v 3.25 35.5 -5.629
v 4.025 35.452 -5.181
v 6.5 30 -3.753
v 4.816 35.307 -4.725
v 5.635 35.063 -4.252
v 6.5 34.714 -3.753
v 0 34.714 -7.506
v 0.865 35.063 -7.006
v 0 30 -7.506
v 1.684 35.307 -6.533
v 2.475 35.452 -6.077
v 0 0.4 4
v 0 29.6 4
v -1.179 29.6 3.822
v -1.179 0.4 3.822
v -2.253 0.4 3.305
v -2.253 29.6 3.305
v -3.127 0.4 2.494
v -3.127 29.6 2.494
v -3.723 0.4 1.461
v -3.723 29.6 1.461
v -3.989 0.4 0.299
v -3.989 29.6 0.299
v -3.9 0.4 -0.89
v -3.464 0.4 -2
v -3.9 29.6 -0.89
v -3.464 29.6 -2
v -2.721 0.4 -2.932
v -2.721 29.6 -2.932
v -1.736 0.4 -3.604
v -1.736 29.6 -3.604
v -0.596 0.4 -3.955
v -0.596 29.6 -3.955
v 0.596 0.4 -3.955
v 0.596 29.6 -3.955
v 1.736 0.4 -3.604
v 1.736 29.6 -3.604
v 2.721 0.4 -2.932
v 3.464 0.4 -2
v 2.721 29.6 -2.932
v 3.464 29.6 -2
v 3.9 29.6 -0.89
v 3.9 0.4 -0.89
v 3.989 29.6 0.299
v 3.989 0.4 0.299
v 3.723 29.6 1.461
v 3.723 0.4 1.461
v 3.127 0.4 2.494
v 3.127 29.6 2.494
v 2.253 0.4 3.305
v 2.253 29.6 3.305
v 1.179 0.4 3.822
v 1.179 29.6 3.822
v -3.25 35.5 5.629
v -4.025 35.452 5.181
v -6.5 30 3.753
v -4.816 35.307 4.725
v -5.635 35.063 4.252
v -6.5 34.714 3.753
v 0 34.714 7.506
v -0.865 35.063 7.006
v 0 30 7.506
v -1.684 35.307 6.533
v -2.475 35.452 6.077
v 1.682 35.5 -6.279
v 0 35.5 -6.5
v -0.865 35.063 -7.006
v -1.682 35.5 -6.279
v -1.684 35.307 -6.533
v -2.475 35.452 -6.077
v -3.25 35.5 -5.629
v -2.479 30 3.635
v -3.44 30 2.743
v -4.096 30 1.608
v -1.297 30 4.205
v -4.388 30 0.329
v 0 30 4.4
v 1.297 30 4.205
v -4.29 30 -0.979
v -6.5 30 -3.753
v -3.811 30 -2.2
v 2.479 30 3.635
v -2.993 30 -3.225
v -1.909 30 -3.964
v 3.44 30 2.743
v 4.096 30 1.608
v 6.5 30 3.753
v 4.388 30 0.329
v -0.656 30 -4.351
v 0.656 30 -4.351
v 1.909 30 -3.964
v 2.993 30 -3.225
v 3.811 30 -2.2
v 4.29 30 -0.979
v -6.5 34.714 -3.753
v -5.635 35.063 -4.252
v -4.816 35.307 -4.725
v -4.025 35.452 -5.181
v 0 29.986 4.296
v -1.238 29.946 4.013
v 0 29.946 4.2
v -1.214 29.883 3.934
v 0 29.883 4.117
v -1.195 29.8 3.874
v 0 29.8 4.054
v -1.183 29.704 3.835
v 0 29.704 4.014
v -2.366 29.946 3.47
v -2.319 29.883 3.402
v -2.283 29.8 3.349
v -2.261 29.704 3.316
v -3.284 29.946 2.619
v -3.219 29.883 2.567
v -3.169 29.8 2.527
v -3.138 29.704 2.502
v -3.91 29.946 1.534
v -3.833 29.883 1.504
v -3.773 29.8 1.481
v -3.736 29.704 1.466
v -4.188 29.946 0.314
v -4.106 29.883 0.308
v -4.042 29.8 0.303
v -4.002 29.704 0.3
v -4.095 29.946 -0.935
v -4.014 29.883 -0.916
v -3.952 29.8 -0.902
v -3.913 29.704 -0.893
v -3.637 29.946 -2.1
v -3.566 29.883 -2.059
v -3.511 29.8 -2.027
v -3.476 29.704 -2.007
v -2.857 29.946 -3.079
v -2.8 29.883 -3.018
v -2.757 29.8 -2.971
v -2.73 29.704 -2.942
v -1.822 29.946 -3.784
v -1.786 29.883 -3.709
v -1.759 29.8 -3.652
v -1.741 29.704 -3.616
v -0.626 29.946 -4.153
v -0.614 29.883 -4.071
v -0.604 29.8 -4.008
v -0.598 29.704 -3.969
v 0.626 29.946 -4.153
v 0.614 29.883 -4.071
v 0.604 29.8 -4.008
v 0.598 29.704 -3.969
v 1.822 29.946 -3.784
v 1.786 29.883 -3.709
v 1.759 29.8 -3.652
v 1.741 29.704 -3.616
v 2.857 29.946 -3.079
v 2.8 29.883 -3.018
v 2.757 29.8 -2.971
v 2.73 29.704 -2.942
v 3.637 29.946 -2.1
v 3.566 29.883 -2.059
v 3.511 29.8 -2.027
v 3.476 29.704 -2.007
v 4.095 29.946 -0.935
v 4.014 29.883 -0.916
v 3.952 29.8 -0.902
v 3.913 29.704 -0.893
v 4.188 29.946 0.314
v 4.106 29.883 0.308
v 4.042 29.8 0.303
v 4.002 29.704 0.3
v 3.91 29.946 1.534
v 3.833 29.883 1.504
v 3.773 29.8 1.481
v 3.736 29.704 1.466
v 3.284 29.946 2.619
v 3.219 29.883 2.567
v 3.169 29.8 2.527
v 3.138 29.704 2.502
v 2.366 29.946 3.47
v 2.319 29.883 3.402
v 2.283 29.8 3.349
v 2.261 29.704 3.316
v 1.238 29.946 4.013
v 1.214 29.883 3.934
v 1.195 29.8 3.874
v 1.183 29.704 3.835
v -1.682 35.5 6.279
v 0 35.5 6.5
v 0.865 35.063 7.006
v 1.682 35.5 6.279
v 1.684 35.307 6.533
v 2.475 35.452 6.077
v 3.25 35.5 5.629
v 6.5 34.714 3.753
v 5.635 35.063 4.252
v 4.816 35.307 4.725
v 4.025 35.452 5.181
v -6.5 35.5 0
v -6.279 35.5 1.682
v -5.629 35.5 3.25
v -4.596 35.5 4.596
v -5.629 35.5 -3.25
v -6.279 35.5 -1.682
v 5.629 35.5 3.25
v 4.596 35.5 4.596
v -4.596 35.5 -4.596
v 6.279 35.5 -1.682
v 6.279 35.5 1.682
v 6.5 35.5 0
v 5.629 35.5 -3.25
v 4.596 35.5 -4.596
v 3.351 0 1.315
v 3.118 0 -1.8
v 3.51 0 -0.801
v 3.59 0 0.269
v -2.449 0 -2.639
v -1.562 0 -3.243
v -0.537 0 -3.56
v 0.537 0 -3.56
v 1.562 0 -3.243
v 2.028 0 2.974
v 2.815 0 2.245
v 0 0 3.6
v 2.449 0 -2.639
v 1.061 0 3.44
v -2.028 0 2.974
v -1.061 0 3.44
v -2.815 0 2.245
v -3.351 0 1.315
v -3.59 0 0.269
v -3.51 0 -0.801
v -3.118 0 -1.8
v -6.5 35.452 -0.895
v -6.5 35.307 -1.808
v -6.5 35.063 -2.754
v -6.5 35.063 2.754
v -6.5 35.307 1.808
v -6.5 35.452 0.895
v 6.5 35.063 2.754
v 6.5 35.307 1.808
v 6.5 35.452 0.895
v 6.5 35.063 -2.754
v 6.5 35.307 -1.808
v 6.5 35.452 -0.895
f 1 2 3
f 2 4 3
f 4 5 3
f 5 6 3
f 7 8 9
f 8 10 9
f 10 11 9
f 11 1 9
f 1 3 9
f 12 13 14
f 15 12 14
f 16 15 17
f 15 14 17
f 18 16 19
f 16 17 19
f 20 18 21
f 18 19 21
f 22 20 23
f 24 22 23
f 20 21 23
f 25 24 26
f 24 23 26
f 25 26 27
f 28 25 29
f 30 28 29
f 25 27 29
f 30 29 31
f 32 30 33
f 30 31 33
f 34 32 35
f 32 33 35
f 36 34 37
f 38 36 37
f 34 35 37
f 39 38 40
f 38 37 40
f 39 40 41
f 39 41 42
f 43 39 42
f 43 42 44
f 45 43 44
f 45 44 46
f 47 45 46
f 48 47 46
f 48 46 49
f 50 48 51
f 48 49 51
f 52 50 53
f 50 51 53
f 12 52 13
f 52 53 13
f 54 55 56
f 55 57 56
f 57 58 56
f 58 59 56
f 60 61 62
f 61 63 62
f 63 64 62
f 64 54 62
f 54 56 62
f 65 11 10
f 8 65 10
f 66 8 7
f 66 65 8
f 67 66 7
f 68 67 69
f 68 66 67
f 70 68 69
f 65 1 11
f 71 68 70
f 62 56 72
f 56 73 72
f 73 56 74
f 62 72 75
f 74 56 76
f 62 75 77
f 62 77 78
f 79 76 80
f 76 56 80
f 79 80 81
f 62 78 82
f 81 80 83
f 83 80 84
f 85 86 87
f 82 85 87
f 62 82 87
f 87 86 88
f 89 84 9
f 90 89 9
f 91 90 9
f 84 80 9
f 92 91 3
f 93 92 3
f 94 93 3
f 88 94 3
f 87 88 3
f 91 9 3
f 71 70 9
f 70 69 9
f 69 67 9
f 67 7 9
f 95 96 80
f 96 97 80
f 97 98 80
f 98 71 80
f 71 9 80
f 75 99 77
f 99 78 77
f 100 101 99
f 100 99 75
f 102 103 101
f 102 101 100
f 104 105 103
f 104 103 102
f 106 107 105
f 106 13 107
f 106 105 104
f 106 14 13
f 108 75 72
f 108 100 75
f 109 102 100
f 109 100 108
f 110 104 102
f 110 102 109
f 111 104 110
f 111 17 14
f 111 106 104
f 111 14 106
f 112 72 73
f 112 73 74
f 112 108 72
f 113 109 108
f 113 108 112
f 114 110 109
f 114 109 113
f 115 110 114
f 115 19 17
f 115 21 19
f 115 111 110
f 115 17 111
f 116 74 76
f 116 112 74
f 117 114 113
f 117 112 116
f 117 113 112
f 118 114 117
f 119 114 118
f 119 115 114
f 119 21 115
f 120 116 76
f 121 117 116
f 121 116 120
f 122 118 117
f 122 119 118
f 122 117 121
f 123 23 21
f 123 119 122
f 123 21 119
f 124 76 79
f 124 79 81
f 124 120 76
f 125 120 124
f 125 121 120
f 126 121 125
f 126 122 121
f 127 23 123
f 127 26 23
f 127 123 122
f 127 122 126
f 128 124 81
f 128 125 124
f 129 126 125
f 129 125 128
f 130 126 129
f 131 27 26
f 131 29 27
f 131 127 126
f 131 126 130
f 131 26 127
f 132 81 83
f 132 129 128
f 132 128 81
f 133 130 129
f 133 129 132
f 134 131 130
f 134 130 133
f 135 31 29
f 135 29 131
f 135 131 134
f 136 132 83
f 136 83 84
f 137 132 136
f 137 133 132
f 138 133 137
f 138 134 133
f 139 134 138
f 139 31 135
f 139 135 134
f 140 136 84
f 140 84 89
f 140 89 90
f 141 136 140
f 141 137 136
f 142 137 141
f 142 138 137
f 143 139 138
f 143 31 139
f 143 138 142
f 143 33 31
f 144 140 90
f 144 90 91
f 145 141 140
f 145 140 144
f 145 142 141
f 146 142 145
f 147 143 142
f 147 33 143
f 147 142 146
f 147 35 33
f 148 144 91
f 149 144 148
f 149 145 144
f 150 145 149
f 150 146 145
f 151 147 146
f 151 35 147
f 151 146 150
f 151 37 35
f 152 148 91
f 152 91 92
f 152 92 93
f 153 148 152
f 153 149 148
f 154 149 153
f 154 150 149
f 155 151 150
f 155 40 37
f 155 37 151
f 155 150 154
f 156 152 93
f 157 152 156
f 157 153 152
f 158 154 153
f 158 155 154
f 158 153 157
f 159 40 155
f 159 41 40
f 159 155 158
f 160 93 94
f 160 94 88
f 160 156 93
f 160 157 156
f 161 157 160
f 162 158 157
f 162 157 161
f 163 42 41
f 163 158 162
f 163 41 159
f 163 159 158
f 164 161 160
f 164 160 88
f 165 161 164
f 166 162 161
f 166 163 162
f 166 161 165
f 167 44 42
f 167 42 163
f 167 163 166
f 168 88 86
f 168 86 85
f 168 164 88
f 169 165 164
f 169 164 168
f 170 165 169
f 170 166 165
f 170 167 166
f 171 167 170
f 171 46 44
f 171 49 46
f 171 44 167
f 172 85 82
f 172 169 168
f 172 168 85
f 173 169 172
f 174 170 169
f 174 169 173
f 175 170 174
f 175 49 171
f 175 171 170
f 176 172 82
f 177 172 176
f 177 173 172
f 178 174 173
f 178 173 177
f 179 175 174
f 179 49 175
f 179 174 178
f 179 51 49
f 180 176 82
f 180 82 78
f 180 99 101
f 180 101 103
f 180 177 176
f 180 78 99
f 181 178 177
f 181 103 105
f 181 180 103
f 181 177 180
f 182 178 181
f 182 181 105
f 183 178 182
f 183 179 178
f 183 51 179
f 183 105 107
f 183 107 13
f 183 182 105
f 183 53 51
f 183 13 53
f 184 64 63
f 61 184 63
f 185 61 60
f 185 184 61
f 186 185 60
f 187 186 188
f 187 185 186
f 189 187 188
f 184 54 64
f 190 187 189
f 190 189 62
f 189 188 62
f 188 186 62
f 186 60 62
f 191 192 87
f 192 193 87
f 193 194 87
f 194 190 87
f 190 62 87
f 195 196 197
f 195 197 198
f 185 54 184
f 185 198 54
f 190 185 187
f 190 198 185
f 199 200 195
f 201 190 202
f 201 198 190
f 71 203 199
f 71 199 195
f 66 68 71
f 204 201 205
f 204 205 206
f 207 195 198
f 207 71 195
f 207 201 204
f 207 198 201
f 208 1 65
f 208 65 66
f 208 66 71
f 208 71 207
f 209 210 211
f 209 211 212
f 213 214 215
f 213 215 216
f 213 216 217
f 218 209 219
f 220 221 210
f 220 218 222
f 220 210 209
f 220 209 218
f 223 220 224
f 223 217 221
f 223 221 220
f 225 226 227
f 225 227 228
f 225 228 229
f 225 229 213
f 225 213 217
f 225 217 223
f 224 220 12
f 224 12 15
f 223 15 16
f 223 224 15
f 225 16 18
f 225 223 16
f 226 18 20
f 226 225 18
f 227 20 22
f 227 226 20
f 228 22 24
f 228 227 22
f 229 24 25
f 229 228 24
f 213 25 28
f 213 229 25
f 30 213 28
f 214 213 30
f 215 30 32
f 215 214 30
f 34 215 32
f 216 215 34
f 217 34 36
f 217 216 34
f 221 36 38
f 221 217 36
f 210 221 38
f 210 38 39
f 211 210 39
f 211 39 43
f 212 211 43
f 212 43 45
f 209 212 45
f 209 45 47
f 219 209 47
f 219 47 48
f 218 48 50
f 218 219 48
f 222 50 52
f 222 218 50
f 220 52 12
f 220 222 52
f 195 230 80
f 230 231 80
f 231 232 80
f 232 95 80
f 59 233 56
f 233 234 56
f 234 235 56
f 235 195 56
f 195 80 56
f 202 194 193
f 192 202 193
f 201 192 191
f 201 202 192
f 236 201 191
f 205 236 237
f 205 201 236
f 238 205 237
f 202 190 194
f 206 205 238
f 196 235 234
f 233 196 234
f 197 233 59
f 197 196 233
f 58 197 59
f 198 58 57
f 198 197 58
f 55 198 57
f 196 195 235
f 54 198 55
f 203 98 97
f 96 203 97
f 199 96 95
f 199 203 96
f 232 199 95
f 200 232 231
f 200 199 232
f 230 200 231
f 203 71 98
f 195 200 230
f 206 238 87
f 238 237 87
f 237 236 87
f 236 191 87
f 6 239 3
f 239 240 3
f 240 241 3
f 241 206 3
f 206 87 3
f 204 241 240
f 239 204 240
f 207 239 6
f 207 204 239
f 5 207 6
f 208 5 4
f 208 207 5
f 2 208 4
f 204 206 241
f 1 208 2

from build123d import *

# Parameters (mm, degrees)
SKETCH1_W           = 4
SKETCH1_H           = 30
BOSS_EXTRUDE1_DEPTH = 5.5
FILLET1_R           = 0.4
CHAMFER1_SIZE       = 0.4
SKETCH3_OUTSIDE_W   = 25.696
SKETCH3_OUTSIDE_H   = 27.708
SKETCH3_OUTSIDE_R   = 6.5
CUT_EXTRUDE1_DEPTH  = 1
CUT_EXTRUDE1_DRAFT  = -52


with BuildPart() as part:
    # Sketch1 → Revolve1 (revolve)
    with BuildSketch(Plane.XY, mode=Mode.PRIVATE) as revolve1_sk:
        with Locations((-2, 15)):
            Rectangle(SKETCH1_W, SKETCH1_H)
    revolve(revolve1_sk.sketch.rotate(Axis((0, 30, 0), (0, -1, 0)), 270), axis=Axis((0, 30, 0), (0, -1, 0)))

    # Sketch2 → Boss-Extrude1 (add)
    with BuildSketch(Plane(origin=(0, 30, 0), x_dir=(1, 0, 0), z_dir=(0, 1, 0))):
        Polygon((0, -7.505553499), (6.5, -3.75277675), (6.5, 3.75277675), (0, 7.505553499), (-6.5, 3.75277675), (-6.5, -3.75277675), align=None)
    extrude(amount=BOSS_EXTRUDE1_DEPTH)

    # Fillet1
    fillet1_edges = [part.edges().sort_by_distance(p)[0] for p in [
        (0, 30, -4),
    ]]
    fillet(fillet1_edges, radius=FILLET1_R)

    # Chamfer1
    chamfer1_edges = [part.edges().sort_by_distance(p)[0] for p in [
        (0, 0, -4),
    ]]
    chamfer(chamfer1_edges, length=CHAMFER1_SIZE)


with BuildPart() as cut_extrude1_tool:
    # Sketch3 outside → Cut-Extrude1 (with draft: the straight prism first)
    with BuildSketch(Plane(origin=(0, 35.5, 0), x_dir=(1, 0, 0), z_dir=(0, 1, 0))):
        Rectangle(SKETCH3_OUTSIDE_W, SKETCH3_OUTSIDE_H)
        Circle(SKETCH3_OUTSIDE_R, mode=Mode.SUBTRACT)
    extrude(amount=-CUT_EXTRUDE1_DEPTH)
    # Cut-Extrude1: the draft: its side faces are tilted about the plane it starts from
    cut_extrude1_sides = [cut_extrude1_tool.faces().sort_by_distance(p)[0] for p in [
        (0, 35, 13.854),
        (12.848, 35, 0),
        (0, 35, -13.854),
        (-12.848, 35, 0),
        (-6.5, 35, 0),
    ]]
    draft(cut_extrude1_sides, Plane(origin=(0, 35.5, 0), x_dir=(1, 0, 0), z_dir=(0, 1, 0)), CUT_EXTRUDE1_DRAFT)


with BuildPart() as part_1:
    add(part.part)

    # Cut-Extrude1: cut by cut_extrude1_tool
    add(cut_extrude1_tool.part, mode=Mode.SUBTRACT)


solid = part_1.part
